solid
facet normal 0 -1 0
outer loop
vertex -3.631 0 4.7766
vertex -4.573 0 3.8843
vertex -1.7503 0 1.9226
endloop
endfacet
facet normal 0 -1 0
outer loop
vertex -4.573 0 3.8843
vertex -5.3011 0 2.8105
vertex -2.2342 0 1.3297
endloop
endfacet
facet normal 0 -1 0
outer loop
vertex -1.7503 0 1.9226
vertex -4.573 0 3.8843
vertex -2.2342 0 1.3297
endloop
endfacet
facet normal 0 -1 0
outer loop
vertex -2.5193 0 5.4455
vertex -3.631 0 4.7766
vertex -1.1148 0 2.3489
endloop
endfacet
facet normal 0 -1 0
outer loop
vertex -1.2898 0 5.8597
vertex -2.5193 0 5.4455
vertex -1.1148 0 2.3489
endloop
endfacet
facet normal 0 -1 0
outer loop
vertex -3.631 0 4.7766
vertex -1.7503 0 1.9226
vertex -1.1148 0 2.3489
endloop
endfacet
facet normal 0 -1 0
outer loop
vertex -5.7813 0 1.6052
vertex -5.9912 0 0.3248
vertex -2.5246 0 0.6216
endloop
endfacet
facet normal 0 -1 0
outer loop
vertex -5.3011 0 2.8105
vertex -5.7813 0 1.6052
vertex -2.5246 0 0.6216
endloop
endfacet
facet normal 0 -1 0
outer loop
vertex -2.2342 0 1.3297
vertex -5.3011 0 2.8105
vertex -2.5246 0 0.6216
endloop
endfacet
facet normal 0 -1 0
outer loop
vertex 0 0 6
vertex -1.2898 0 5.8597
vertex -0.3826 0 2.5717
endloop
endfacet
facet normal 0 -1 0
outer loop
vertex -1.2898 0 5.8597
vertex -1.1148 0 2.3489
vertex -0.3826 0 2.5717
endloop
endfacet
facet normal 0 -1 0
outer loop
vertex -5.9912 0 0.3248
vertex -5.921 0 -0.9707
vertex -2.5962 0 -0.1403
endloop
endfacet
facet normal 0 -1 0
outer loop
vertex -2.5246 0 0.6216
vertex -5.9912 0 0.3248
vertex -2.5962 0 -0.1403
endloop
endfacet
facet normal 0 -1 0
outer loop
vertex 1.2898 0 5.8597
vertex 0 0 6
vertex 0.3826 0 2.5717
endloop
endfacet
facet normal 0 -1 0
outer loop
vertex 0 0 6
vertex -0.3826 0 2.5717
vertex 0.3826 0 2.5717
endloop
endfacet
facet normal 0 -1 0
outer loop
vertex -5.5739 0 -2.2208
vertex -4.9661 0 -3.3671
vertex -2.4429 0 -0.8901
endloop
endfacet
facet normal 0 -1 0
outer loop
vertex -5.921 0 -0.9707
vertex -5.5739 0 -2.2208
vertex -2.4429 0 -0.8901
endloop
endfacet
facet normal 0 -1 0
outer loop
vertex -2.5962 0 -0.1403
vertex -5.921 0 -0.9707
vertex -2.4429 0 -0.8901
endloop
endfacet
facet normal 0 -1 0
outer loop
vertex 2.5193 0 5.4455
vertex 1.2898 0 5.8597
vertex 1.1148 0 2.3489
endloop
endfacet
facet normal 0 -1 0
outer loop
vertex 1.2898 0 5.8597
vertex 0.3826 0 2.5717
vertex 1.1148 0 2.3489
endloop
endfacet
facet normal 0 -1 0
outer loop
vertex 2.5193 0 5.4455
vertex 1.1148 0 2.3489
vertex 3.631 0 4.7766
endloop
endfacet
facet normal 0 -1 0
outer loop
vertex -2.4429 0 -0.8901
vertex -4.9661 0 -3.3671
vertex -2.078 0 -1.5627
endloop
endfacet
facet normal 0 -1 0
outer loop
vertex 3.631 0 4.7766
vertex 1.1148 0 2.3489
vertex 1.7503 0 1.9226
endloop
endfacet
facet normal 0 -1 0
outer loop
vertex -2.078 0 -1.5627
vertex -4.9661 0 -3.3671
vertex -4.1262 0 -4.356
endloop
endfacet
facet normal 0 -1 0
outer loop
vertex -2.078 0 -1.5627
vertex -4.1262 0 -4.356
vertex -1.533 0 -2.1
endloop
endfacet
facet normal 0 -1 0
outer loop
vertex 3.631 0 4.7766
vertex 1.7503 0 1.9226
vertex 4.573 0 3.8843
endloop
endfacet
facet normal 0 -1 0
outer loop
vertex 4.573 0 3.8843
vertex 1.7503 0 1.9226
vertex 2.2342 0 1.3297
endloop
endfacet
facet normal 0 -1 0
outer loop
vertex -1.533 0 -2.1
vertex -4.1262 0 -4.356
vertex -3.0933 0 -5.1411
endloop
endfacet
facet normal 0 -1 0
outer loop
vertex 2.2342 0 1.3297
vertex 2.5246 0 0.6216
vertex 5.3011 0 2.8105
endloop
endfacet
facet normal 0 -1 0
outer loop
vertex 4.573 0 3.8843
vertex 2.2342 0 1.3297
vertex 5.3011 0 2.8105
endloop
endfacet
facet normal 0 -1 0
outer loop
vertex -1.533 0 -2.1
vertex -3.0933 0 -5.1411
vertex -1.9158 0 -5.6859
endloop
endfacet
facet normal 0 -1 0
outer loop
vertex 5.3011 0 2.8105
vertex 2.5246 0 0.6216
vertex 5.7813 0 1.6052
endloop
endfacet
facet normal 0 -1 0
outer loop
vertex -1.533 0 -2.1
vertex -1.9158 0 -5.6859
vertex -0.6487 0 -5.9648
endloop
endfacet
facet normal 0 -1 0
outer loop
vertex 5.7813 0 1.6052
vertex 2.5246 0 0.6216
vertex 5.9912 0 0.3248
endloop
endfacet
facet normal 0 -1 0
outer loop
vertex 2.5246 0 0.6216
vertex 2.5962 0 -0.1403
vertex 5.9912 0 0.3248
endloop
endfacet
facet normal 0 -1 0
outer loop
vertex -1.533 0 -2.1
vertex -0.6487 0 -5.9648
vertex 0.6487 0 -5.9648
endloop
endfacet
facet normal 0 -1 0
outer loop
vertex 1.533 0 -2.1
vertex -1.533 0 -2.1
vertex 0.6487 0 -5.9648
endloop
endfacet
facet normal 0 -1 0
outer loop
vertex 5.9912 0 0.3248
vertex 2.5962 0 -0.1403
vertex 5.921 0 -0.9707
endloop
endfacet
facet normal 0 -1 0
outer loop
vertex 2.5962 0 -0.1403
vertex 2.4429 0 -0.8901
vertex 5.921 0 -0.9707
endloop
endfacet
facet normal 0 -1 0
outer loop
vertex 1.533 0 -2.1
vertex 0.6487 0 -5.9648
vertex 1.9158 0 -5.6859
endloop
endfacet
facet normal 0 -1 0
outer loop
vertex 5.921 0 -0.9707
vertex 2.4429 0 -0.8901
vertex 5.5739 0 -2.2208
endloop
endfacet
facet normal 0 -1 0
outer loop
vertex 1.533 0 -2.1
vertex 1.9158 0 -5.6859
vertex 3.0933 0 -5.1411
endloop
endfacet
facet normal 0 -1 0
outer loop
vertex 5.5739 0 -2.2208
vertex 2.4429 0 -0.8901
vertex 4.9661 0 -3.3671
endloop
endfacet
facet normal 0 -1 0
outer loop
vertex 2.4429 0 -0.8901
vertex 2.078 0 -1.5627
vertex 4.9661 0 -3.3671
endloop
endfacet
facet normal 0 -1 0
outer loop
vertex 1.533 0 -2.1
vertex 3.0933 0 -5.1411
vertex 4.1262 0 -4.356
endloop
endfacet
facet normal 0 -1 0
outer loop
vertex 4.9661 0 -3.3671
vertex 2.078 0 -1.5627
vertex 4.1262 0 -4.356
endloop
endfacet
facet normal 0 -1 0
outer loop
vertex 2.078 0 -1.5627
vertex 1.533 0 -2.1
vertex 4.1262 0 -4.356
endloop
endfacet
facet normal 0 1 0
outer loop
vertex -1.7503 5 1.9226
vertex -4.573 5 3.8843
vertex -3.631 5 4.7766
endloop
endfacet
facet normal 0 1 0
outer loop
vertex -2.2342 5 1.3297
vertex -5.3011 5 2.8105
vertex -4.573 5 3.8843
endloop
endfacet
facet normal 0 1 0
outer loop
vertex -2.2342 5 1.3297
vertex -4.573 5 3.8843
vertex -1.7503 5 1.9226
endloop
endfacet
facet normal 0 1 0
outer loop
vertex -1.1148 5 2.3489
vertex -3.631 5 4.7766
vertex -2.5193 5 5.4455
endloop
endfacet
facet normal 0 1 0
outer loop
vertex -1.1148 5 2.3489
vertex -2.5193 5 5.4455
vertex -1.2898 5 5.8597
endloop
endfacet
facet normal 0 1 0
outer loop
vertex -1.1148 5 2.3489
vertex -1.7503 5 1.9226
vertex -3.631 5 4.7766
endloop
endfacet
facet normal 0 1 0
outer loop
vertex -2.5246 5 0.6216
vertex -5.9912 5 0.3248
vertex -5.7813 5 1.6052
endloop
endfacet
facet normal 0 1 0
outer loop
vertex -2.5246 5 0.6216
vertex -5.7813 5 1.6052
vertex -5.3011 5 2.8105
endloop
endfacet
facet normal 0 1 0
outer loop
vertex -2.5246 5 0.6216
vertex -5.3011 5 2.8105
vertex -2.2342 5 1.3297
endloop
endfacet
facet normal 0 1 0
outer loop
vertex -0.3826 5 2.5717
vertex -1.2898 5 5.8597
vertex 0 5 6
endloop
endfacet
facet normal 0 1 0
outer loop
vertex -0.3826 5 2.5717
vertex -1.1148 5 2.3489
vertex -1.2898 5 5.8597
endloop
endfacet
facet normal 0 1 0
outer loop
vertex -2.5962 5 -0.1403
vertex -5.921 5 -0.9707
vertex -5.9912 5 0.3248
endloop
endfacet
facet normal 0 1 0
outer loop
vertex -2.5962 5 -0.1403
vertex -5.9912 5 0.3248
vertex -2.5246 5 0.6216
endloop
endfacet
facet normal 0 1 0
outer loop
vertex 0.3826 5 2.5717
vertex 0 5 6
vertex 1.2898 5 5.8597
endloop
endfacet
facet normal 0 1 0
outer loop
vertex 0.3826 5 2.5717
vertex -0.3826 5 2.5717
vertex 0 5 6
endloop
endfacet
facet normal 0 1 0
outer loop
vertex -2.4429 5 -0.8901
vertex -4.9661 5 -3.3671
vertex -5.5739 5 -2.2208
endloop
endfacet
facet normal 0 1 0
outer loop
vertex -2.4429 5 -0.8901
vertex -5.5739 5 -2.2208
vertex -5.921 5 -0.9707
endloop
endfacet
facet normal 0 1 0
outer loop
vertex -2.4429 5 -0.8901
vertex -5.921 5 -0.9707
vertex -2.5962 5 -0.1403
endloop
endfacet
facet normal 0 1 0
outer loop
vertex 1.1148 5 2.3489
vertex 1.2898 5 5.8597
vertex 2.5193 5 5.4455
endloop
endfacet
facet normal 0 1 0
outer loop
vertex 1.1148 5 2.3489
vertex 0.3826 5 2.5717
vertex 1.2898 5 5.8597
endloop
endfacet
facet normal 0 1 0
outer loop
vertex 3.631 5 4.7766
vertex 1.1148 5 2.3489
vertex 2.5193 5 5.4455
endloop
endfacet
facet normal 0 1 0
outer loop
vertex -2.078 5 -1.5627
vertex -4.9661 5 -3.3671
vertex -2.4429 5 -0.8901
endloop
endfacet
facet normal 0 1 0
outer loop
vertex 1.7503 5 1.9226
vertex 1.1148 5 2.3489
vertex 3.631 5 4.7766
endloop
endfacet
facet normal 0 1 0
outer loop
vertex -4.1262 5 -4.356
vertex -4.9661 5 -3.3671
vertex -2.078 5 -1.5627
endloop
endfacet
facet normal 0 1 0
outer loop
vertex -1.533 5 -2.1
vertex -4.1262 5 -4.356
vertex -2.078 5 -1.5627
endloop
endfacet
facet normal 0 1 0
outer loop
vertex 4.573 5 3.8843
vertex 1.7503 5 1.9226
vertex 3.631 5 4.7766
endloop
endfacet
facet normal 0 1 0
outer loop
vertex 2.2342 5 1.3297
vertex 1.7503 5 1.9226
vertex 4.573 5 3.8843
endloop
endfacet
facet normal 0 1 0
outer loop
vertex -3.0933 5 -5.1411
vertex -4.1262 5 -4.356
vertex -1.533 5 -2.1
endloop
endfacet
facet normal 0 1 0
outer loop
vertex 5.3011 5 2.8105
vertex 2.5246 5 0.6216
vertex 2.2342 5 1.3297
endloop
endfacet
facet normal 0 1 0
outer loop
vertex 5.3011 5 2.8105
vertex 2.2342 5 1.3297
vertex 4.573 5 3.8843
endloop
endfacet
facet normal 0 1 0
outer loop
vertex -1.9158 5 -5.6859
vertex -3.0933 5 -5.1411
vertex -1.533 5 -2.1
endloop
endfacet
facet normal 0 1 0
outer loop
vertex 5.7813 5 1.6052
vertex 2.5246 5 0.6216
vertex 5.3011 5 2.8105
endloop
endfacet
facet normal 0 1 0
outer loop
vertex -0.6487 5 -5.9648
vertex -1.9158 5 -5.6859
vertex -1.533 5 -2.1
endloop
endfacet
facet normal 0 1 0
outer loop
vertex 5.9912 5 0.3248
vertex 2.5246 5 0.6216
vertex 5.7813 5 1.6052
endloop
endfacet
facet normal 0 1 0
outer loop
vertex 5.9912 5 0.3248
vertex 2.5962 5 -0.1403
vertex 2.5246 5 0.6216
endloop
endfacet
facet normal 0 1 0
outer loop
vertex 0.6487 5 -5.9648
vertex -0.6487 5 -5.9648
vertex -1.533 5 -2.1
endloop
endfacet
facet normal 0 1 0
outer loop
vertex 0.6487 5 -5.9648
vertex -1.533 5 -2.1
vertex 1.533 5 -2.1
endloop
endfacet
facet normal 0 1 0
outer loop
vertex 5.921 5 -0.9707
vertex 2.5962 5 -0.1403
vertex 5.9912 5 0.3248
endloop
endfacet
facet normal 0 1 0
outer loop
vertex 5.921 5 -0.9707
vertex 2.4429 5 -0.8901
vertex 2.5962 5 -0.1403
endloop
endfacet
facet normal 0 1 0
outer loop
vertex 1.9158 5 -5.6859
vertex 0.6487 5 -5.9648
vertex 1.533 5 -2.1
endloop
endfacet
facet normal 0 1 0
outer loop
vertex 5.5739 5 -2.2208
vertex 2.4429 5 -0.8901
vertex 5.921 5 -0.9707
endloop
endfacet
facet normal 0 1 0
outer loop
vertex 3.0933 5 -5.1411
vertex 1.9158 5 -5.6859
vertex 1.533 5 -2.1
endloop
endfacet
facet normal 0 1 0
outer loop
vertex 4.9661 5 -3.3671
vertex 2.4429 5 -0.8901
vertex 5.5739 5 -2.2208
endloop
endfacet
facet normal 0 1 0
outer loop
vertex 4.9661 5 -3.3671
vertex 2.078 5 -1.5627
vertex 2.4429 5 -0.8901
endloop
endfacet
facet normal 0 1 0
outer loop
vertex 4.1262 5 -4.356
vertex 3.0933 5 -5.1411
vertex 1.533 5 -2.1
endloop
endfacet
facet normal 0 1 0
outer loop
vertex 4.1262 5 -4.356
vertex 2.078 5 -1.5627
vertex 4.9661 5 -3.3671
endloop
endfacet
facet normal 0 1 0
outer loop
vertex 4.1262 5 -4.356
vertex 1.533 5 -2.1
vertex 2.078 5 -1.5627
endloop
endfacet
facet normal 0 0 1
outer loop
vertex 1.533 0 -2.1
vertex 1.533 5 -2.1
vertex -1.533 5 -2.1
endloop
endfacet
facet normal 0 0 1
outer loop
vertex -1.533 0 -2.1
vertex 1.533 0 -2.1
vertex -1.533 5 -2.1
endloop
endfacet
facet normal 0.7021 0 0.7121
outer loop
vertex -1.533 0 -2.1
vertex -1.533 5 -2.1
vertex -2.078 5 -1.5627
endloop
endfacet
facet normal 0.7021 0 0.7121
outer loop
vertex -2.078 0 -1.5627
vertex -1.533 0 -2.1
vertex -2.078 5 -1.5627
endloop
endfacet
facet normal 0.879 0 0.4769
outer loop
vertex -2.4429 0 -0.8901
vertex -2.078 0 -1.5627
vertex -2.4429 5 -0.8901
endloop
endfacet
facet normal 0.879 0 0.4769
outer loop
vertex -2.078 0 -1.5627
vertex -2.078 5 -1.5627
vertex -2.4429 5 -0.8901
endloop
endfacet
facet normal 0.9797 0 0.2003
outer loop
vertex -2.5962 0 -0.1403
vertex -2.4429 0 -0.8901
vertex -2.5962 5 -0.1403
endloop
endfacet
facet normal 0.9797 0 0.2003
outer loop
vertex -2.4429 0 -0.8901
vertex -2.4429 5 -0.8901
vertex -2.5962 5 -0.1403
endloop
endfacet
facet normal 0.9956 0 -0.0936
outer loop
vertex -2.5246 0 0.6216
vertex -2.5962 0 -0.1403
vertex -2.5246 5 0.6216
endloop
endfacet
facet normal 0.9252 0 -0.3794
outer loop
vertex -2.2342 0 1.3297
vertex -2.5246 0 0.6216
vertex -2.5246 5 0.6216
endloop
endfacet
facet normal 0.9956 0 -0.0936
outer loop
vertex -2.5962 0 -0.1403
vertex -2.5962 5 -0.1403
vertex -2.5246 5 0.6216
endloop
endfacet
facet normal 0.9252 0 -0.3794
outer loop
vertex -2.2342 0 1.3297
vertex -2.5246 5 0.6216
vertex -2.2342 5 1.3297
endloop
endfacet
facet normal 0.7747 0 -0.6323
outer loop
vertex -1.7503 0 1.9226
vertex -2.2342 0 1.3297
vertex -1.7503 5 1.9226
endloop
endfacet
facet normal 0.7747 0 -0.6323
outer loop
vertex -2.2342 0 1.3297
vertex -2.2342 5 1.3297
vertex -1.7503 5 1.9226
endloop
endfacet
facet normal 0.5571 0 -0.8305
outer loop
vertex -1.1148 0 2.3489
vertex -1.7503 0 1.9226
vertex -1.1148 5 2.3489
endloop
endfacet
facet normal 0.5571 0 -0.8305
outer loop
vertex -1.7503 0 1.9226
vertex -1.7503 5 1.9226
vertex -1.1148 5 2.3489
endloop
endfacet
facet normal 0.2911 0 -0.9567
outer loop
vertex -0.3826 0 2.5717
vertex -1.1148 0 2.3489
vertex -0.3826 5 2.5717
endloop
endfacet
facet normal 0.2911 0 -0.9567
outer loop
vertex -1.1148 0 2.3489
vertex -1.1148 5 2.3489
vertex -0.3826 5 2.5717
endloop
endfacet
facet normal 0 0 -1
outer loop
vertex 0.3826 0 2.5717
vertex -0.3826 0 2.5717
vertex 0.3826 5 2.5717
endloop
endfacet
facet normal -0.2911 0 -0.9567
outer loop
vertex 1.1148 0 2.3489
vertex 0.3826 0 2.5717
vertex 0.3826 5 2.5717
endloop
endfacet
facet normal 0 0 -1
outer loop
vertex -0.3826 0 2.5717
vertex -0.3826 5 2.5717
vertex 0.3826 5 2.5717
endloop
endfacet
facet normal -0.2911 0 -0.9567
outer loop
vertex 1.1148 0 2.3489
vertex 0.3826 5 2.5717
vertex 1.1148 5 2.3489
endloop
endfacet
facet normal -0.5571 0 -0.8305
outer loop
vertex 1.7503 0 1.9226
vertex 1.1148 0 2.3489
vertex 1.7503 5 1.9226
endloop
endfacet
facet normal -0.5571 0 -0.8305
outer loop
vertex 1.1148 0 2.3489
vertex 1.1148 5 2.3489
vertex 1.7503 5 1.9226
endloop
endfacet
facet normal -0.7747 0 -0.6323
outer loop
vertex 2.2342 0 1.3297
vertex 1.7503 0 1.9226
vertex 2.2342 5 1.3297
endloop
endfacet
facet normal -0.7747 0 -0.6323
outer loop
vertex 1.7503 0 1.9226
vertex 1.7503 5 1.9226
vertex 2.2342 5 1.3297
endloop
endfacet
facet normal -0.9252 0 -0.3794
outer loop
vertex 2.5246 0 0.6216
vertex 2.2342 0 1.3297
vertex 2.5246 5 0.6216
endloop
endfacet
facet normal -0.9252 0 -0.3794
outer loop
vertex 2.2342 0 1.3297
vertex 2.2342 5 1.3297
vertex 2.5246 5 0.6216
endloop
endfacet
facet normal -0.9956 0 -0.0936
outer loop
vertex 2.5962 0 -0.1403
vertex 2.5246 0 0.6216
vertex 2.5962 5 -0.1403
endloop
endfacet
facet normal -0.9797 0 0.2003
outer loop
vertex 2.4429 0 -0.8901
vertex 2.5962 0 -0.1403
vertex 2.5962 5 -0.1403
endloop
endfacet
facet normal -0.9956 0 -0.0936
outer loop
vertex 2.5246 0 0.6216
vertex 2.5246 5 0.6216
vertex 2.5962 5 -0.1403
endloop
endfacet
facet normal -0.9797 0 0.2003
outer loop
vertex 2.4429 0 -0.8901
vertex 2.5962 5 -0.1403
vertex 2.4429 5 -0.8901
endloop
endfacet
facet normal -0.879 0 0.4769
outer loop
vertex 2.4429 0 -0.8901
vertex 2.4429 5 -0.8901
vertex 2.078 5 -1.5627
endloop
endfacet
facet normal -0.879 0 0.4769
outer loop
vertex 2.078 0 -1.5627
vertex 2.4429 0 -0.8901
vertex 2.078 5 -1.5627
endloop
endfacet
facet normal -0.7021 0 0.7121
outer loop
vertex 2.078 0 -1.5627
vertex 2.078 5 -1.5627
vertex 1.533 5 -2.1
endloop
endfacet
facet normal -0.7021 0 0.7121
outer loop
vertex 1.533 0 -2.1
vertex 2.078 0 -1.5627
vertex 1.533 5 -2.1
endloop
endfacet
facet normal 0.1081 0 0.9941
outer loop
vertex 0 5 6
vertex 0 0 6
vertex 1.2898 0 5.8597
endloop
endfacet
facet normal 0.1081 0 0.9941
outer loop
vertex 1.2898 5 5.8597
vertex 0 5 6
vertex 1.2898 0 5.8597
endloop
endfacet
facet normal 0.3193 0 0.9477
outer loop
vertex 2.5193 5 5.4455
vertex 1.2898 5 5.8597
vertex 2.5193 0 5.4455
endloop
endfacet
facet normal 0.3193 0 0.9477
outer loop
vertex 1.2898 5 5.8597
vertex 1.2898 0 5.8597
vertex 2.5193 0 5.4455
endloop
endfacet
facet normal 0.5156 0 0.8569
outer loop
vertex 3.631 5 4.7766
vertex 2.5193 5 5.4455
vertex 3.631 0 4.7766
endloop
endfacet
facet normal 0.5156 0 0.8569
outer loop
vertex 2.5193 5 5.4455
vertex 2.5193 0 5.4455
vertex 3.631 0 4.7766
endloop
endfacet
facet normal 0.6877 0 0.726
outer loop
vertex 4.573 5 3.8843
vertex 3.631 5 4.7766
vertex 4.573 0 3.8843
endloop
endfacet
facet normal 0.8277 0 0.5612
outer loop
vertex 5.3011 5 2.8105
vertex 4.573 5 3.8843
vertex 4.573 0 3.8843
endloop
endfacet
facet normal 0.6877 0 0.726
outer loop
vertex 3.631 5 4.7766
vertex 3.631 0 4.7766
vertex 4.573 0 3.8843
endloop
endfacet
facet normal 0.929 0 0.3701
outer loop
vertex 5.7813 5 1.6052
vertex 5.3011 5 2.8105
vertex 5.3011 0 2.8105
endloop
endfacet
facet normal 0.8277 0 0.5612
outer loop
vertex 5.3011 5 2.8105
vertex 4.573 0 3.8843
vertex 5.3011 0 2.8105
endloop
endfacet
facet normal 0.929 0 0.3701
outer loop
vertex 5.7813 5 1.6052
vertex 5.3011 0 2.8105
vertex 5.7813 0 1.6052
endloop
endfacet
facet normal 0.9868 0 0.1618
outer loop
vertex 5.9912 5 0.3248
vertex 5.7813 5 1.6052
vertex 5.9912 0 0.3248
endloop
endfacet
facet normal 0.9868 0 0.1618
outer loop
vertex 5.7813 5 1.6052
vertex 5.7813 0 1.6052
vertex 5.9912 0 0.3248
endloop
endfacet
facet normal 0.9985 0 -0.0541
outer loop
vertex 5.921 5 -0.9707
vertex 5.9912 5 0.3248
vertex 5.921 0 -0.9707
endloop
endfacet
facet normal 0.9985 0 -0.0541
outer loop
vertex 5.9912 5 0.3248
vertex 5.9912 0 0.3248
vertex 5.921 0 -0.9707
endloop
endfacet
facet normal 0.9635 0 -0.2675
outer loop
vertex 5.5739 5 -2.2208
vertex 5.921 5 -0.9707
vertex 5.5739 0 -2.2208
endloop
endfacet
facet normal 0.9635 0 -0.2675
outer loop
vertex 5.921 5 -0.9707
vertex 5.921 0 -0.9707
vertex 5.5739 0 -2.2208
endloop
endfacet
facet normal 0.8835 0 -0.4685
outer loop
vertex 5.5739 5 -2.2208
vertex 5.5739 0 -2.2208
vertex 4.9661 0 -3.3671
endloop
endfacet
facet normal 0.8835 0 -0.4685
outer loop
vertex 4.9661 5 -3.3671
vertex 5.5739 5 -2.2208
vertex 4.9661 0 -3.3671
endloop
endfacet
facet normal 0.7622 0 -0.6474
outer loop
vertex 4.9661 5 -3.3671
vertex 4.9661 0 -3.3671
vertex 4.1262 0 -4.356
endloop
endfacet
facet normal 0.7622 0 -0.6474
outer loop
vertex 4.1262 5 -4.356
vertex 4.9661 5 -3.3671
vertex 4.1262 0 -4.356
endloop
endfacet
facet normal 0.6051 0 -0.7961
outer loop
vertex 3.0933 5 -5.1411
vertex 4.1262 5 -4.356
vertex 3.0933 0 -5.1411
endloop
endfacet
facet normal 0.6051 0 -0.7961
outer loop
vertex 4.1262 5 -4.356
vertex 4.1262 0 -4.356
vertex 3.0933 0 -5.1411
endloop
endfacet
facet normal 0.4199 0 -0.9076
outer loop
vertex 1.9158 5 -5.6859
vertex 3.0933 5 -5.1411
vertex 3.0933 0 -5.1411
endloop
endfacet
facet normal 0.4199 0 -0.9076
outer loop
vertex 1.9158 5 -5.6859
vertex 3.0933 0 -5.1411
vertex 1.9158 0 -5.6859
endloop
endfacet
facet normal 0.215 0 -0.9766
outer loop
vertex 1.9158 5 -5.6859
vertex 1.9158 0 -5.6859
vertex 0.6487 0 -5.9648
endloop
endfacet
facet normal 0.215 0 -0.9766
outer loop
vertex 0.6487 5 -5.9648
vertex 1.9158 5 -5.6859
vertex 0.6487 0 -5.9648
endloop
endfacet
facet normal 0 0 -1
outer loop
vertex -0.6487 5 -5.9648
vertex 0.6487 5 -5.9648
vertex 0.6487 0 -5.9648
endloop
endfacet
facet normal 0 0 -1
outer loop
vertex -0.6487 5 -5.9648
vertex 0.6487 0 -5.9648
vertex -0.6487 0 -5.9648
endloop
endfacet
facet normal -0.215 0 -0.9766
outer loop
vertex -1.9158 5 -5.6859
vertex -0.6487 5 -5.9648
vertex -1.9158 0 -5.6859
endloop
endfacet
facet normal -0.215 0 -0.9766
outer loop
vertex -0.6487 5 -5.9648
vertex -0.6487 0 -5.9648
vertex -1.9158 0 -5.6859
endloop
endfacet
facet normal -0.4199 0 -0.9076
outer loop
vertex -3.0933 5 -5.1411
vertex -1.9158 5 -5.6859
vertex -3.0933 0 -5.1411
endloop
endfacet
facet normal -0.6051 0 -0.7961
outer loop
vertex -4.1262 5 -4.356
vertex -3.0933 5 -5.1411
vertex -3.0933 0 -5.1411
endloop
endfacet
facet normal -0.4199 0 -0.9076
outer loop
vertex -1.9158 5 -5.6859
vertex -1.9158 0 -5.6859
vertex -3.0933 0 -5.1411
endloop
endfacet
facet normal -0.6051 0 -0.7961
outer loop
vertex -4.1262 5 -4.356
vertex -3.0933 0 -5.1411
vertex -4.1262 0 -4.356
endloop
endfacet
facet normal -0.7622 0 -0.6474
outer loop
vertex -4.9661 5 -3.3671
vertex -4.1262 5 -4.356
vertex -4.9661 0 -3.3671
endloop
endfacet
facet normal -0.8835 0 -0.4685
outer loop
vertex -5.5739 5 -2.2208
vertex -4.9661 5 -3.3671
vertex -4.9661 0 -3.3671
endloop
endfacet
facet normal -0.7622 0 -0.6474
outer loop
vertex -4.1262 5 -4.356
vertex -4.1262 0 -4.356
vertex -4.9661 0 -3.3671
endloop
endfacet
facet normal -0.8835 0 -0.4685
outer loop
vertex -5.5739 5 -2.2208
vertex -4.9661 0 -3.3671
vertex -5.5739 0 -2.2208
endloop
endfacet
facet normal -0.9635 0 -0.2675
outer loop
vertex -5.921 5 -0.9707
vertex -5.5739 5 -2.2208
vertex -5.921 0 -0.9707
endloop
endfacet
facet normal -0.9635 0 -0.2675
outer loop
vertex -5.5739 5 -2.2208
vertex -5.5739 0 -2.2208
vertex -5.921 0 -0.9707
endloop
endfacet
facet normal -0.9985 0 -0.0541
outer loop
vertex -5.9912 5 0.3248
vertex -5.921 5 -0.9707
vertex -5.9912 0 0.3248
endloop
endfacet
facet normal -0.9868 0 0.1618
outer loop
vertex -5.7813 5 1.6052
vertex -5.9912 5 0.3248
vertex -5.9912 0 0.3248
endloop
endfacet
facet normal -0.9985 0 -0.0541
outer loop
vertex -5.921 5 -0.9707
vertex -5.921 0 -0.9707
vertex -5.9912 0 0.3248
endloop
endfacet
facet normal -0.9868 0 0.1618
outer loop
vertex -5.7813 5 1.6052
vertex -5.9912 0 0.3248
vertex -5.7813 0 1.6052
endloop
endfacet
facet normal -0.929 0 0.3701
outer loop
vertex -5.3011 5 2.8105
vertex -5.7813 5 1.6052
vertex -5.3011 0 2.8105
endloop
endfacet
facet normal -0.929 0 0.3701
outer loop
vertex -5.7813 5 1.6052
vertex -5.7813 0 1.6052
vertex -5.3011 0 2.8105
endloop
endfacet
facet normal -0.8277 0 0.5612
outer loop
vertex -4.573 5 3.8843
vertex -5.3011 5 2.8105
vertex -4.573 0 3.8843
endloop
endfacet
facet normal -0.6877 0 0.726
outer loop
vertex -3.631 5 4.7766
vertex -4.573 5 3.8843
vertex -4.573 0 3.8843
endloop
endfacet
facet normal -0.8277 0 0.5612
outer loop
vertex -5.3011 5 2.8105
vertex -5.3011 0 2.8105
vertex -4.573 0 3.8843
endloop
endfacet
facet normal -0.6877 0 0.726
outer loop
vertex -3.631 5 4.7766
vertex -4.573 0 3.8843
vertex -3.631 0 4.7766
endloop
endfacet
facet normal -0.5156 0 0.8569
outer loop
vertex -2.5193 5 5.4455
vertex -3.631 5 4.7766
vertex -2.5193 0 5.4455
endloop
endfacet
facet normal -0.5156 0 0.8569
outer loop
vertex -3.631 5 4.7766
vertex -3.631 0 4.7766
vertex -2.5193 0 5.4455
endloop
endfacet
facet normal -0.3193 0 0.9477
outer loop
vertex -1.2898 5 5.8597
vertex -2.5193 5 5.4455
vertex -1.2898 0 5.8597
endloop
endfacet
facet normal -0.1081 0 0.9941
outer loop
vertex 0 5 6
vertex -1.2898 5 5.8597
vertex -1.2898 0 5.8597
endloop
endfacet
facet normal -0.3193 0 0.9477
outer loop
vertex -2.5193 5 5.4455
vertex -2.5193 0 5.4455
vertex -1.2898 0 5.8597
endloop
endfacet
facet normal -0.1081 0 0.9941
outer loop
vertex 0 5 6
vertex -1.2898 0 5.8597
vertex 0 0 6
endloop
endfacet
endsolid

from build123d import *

# Parameters (mm, degrees)
SKETCH1_R           = 6
BOSS_EXTRUDE1_DEPTH = 5
BOSS_EXTRUDE2_START = -5
BOSS_EXTRUDE2_DEPTH = 5
CUT_EXTRUDE1_DEPTH  = 5


with BuildPart() as part:
    # Sketch1 → Boss-Extrude1 (new body)
    with BuildSketch(Plane(origin=(0, 0, 0), x_dir=(1, 0, 0), z_dir=(0, 1, 0))):
        with Locations(Location((0, 0, 0), (0, 0, 270))):
            Circle(SKETCH1_R)
        with BuildLine():
            ThreePointArc((-1.549193338, 2.15), (0, -2.65), (1.549193338, 2.15))
            Line((1.549193338, 2.15), (-1.549193338, 2.15))
        make_face(mode=Mode.SUBTRACT)
    extrude(amount=BOSS_EXTRUDE1_DEPTH)

    # Sketch2 → Boss-Extrude2 (add)
    with BuildSketch(Plane(origin=(0, 5, 0), x_dir=(1, 0, 0), z_dir=(0, 1, 0)).offset(BOSS_EXTRUDE2_START)):
        with BuildLine():
            Line((1.549193338, 2.15), (-1.549193338, 2.15))
            ThreePointArc((-1.549193338, 2.15), (0, -2.65), (1.549193338, 2.15))
        make_face()
        with BuildLine():
            Line((1.526433752, 2.08), (-1.526433752, 2.08))
            ThreePointArc((-1.526433752, 2.08), (0, -2.58), (1.526433752, 2.08))
        make_face(mode=Mode.SUBTRACT)
    extrude(amount=BOSS_EXTRUDE2_DEPTH)

    # Sketch3 → Cut-Extrude1 (cut)
    with BuildSketch(Plane(origin=(0, 5, 0), x_dir=(1, 0, 0), z_dir=(0, 1, 0))):
        with BuildLine():
            Line((1.532970972, 2.1), (-1.532970972, 2.1))
            ThreePointArc((-1.532970972, 2.1), (0, -2.6), (1.532970972, 2.1))
        make_face()
    extrude(amount=-CUT_EXTRUDE1_DEPTH, mode=Mode.SUBTRACT)


solid = part.part
